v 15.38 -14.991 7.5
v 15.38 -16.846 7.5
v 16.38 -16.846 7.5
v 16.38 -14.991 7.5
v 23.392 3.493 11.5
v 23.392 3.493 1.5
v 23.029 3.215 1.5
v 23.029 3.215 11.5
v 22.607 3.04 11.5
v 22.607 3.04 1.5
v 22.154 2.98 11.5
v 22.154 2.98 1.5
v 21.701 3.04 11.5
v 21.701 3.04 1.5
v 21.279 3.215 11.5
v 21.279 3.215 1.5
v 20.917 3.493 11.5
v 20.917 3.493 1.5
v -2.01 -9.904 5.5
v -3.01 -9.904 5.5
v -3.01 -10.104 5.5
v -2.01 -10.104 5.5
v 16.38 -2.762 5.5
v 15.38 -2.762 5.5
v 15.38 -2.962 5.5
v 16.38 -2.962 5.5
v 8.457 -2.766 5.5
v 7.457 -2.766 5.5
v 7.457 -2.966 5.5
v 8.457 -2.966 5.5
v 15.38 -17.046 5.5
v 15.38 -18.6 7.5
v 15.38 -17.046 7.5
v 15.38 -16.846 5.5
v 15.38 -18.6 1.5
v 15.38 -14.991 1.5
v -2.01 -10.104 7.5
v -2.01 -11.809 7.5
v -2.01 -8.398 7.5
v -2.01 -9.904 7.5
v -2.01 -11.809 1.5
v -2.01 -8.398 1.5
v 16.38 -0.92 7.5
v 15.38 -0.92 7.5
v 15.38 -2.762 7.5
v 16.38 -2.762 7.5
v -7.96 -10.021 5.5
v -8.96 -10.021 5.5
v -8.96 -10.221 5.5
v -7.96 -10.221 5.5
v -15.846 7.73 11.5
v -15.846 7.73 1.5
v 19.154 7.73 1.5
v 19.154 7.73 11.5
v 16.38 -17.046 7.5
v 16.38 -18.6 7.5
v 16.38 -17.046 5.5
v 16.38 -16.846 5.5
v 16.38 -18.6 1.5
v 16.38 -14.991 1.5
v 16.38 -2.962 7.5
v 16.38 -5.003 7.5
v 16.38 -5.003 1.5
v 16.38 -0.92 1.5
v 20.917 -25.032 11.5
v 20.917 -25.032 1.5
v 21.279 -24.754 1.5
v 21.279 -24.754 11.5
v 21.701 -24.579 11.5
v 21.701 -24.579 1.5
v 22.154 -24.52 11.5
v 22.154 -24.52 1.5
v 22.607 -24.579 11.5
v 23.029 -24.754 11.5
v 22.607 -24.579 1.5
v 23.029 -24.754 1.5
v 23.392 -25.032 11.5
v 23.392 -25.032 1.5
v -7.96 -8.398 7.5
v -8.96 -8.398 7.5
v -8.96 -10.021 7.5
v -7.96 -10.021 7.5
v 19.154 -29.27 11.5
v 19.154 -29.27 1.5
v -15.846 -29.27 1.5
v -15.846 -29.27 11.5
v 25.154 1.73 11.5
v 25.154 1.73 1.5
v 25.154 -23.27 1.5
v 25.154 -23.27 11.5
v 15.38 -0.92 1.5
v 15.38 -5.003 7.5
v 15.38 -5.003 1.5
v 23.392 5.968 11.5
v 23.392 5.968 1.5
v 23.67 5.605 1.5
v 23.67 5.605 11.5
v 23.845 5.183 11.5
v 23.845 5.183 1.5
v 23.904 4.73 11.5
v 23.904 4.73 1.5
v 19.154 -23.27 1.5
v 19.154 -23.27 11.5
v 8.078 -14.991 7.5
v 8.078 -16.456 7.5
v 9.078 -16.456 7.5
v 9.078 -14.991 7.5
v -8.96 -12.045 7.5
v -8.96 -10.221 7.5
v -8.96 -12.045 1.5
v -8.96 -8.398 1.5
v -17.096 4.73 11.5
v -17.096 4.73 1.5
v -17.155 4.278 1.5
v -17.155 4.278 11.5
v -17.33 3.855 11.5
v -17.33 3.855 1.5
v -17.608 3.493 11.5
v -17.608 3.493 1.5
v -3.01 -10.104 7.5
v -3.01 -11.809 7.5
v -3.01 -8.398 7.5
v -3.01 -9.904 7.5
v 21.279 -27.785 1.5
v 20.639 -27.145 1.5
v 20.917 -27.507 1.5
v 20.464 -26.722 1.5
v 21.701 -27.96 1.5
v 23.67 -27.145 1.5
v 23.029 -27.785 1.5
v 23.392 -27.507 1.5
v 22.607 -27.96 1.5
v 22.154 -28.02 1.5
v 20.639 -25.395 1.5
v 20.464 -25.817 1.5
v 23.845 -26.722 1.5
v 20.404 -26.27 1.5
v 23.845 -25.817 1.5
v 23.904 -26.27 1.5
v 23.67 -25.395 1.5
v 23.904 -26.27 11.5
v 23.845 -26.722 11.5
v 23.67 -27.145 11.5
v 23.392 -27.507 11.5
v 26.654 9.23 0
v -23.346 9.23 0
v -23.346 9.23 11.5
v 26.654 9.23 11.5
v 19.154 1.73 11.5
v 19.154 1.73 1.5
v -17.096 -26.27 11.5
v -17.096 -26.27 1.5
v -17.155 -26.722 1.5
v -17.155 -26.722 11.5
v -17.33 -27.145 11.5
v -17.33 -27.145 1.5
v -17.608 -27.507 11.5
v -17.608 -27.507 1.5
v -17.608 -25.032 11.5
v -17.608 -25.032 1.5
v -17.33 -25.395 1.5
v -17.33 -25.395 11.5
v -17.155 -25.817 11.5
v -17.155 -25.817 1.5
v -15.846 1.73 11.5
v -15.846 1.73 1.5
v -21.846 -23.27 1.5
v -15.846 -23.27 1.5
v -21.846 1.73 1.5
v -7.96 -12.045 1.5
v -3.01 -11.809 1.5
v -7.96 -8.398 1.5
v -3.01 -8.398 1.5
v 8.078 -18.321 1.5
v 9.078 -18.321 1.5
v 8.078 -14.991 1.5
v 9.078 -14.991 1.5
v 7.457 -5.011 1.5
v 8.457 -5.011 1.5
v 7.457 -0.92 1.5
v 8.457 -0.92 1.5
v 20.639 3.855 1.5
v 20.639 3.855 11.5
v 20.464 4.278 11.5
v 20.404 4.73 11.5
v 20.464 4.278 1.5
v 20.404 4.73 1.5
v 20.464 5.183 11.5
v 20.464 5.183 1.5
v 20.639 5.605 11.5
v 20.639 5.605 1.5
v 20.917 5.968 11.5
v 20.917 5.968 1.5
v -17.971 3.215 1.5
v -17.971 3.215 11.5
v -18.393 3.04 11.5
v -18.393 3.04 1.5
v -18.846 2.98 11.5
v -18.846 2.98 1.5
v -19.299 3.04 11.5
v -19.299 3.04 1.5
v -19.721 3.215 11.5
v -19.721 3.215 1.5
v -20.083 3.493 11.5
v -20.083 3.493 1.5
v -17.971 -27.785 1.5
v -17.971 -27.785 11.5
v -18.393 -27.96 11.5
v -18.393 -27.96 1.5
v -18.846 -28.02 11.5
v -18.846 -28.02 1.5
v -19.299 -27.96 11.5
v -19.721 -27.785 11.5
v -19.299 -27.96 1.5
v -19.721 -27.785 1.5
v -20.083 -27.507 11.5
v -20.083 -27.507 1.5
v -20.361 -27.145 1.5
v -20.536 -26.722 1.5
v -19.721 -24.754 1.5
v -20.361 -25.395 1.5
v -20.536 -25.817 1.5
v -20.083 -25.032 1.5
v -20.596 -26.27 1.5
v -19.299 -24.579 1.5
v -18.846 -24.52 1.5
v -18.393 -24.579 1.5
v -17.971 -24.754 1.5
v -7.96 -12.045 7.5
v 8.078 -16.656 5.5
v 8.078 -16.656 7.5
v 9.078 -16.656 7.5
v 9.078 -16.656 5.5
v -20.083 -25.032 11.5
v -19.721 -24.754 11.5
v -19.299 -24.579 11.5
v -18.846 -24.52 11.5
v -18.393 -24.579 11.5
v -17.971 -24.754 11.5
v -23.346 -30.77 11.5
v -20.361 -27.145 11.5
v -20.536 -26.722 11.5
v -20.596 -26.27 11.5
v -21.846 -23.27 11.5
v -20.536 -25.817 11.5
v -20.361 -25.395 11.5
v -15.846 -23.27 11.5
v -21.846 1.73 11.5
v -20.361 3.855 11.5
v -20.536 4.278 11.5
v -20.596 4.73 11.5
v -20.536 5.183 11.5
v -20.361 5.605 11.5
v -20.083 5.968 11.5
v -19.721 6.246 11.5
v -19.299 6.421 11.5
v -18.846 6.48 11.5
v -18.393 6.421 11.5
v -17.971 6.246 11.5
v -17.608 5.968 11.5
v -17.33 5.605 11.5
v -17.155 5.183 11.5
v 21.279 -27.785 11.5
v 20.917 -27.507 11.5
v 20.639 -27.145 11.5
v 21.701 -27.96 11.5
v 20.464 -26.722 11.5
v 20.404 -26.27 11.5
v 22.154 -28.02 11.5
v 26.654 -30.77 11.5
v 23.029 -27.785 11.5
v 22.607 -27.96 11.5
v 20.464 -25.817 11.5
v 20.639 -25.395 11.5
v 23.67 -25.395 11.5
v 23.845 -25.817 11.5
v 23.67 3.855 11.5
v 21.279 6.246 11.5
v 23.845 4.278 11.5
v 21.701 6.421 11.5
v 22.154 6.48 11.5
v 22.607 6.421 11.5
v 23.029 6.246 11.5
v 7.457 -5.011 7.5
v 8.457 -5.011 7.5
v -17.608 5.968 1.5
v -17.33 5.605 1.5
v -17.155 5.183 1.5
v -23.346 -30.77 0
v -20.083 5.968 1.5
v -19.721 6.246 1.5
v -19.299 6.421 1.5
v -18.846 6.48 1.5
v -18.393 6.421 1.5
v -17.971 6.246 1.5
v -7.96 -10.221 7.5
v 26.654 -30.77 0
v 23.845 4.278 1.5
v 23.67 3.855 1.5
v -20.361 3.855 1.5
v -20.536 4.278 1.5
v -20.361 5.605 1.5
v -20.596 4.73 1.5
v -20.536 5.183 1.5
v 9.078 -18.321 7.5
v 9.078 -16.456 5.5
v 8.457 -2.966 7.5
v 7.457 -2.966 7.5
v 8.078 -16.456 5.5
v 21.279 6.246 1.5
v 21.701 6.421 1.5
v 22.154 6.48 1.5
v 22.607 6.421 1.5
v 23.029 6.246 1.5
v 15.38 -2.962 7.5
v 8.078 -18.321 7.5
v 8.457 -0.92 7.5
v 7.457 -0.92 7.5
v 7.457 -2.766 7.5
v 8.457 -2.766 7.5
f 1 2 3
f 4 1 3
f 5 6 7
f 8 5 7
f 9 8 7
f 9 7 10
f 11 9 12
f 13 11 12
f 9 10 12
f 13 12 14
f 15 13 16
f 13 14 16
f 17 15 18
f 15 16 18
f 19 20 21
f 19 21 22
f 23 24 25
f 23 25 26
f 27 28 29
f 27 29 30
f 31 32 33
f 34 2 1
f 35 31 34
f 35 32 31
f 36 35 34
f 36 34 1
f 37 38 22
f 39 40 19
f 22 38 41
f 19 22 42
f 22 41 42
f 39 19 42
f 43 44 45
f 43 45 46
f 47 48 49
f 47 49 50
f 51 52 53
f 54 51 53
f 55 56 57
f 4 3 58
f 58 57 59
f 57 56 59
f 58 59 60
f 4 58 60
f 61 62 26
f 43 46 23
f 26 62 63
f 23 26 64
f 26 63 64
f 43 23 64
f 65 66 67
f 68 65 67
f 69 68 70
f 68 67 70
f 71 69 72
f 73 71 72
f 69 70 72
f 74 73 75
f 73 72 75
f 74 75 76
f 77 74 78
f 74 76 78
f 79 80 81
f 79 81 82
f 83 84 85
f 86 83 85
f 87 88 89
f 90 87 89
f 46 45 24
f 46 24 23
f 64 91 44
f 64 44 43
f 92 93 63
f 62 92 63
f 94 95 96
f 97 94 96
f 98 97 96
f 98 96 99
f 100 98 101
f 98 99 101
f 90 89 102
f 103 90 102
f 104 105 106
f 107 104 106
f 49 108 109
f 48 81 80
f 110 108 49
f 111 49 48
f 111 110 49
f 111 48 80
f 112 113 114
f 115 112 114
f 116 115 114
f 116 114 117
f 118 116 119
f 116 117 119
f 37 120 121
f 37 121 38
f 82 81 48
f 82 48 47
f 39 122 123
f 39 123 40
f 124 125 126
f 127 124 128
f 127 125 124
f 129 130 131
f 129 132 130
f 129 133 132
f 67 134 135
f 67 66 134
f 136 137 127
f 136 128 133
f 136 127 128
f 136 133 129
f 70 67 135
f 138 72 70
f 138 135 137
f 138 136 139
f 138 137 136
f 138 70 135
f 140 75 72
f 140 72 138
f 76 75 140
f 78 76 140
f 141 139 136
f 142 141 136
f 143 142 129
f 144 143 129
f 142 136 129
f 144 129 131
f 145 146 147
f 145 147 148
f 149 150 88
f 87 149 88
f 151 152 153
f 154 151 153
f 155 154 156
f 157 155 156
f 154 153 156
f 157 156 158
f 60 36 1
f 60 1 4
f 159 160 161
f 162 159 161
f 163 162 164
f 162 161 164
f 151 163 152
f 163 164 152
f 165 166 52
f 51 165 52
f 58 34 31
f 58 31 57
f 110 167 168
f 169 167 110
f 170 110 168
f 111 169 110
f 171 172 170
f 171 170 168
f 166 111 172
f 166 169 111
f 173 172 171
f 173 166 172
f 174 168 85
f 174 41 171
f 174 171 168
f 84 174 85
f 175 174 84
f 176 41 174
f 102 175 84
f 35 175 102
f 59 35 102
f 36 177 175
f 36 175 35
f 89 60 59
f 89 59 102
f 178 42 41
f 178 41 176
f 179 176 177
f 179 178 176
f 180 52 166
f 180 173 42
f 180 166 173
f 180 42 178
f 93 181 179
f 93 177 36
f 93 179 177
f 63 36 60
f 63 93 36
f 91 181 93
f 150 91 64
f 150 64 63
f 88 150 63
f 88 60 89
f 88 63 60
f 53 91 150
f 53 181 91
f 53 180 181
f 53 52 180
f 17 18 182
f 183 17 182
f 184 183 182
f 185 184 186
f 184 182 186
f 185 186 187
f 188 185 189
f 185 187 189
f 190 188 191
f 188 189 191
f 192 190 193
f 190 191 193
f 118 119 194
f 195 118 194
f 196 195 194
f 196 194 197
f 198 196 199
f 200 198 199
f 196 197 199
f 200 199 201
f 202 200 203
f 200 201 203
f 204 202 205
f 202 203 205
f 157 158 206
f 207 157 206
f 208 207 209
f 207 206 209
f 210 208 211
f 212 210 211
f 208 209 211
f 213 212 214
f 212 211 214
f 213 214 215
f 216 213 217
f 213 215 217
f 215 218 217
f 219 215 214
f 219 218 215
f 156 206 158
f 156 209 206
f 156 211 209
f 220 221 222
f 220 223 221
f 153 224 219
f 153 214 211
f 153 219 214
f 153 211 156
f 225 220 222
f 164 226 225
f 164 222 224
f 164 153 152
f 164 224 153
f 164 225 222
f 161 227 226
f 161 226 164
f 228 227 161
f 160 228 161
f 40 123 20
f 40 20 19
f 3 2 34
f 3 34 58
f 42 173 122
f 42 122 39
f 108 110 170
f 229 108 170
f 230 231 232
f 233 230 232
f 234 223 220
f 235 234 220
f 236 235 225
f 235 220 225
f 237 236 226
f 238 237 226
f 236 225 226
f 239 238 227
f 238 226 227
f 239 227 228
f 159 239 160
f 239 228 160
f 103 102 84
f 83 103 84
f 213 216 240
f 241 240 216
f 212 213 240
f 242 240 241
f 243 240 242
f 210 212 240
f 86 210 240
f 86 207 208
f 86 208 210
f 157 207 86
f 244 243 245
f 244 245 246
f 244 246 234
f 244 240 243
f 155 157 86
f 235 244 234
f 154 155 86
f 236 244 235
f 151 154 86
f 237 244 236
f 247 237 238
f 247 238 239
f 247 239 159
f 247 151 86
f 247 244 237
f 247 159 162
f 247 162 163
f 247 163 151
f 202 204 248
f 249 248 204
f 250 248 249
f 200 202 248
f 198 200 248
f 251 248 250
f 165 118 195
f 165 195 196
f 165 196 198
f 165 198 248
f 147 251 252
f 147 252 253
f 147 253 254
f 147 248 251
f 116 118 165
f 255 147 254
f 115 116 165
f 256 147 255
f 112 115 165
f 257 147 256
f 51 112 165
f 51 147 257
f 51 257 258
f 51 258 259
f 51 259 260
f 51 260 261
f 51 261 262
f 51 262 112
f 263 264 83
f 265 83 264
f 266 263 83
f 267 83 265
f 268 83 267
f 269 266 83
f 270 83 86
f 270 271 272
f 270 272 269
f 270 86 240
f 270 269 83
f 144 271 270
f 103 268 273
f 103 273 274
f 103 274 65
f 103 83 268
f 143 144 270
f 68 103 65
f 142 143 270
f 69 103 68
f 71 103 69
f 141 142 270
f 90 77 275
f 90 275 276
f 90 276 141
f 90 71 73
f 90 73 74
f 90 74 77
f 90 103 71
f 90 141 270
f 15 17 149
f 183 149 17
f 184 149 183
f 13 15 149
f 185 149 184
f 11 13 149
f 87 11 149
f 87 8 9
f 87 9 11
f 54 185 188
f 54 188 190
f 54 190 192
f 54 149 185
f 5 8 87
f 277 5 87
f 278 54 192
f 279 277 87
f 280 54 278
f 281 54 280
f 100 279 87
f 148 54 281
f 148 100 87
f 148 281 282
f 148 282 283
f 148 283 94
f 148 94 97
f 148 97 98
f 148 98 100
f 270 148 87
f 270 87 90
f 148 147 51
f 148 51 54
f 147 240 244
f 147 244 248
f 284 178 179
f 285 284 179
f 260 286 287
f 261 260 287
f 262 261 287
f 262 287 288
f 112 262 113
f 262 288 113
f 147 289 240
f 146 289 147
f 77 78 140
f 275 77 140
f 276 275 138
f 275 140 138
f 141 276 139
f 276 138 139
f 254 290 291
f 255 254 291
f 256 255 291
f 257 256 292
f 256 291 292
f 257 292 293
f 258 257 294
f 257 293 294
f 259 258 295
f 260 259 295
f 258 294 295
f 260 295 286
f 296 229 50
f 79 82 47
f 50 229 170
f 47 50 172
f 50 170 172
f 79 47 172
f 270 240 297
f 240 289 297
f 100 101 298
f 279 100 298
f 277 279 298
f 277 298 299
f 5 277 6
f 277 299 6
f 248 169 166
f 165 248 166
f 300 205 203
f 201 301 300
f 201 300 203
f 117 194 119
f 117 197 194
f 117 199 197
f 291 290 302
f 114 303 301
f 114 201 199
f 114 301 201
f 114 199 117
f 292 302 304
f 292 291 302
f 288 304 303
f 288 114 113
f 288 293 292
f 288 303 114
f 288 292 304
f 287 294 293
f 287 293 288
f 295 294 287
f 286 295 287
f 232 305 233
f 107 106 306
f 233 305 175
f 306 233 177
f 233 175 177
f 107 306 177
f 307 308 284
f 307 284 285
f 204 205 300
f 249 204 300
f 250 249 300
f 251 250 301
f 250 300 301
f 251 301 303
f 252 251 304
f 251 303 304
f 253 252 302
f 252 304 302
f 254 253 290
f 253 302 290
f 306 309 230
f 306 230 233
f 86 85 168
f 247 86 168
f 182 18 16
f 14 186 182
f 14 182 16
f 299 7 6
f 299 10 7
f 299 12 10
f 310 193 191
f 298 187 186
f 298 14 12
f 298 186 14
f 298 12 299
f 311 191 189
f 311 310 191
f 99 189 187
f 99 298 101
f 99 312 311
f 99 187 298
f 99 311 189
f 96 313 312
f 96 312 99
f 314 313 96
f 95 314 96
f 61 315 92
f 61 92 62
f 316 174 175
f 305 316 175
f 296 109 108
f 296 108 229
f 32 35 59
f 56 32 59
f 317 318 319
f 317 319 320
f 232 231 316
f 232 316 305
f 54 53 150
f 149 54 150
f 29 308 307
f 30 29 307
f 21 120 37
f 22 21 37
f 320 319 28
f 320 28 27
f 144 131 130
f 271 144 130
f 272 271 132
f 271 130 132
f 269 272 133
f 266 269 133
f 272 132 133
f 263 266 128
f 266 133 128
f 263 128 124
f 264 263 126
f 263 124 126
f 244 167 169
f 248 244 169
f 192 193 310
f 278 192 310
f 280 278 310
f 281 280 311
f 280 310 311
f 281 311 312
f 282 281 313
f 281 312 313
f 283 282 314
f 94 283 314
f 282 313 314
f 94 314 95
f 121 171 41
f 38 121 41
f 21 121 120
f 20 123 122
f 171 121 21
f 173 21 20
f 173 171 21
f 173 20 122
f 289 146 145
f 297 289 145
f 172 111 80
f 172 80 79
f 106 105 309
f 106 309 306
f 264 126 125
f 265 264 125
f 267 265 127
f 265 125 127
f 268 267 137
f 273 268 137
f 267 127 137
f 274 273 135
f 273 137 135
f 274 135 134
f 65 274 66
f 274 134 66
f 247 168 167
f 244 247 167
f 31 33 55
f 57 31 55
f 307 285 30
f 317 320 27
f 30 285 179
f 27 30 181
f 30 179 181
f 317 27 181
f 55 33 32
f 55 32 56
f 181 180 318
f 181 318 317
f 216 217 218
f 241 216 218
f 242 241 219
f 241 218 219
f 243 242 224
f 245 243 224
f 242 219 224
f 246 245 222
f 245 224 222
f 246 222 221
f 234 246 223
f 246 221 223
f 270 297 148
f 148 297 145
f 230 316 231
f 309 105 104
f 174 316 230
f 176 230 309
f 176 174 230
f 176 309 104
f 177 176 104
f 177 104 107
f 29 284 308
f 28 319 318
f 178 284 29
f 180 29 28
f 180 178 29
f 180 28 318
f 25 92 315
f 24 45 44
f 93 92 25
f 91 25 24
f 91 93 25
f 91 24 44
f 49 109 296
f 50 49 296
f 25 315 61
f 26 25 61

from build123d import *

# Parameters (mm, degrees)
F0_W      = 50
F0_H      = 40
F1_DEPTH  = 1.5
F2_W      = 50
F2_H      = 40
F3_DEPTH  = 10
F5_DEPTH  = 10
F7_DEPTH  = 10
F9_DEPTH  = 10
F11_DEPTH = 10
F14_W     = 1
F14_H     = 4.08333
F15_DEPTH = 6
F16_W     = 1
F16_H     = 0.2
F17_DEPTH = 2
F18_W     = 1
F18_H     = 3.60977
F19_DEPTH = 6
F20_W     = 1
F20_H     = 0.2
F21_DEPTH = 2
F22_W     = 1
F22_H     = 4.091013
F23_DEPTH = 6
F24_W     = 1
F24_H     = 0.2
F25_DEPTH = 2
F26_W     = 1
F26_H     = 3.330472
F27_DEPTH = 6
F28_W     = 1
F28_H     = 0.2
F29_DEPTH = 2
F30_W     = 1
F30_H     = 3.411457
F31_DEPTH = 6
F32_W     = 1
F32_H     = 0.2
F33_DEPTH = 2
F34_W     = 1
F34_H     = 3.646998
F35_DEPTH = 6
F36_W     = 1
F36_H     = 0.2
F37_DEPTH = 2


with BuildPart() as f1:
    # F0 (on Top) → F1 (new body)
    with BuildSketch(Plane.XY):
        with Locations((1.654343, -10.769538)):
            Rectangle(F0_W, F0_H)
    extrude(amount=F1_DEPTH)

    # F2 (on face) → F3 (join)
    with BuildSketch(Plane.XY.offset(1.5)):
        with Locations((1.654343, -10.769538)):
            Rectangle(F2_W, F2_H)
        Polygon((-21.845657, -29.269538), (-21.845657, 7.730462), (19.154343, 7.730462), (25.154343, 7.730462), (25.154343, 1.730462), (25.154343, -29.269538), align=None, mode=Mode.SUBTRACT)
    extrude(amount=F3_DEPTH)

    # F4 (on face) → F5 (join)
    with BuildSketch(Plane.XY.offset(1.5)):
        with BuildLine():
            Line((-20.083094, 5.967899), (-21.845657, 7.730462))
            Line((-21.845657, 7.730462), (-21.845657, 1.730462))
            Line((-21.845657, 1.730462), (-20.083094, 3.493025))
            ThreePointArc((-20.083094, 3.493025), (-20.595657, 4.730462), (-20.083094, 5.967899))
        make_face()
        with BuildLine():
            Line((-15.845657, 7.730462), (-21.845657, 7.730462))
            Line((-21.845657, 7.730462), (-20.083094, 5.967899))
            ThreePointArc((-20.083094, 5.967899), (-18.845657, 6.480462), (-17.60822, 5.967899))
            Line((-17.60822, 5.967899), (-15.845657, 7.730462))
        make_face()
        with BuildLine():
            Line((-15.845657, 1.730462), (-15.845657, 7.730462))
            Line((-15.845657, 7.730462), (-17.60822, 5.967899))
            ThreePointArc((-17.60822, 5.967899), (-17.228868, 5.400158), (-17.095657, 4.730462))
            ThreePointArc((-17.095657, 4.730462), (-17.228868, 4.060766), (-17.60822, 3.493025))
            Line((-17.60822, 3.493025), (-15.845657, 1.730462))
        make_face()
        with BuildLine():
            Line((-20.083094, 3.493025), (-21.845657, 1.730462))
            Line((-21.845657, 1.730462), (-15.845657, 1.730462))
            Line((-15.845657, 1.730462), (-17.60822, 3.493025))
            ThreePointArc((-17.60822, 3.493025), (-18.845657, 2.980462), (-20.083094, 3.493025))
        make_face()
    extrude(amount=F5_DEPTH)

    # F6 (on face) → F7 (join)
    with BuildSketch(Plane.XY.offset(1.5)):
        with BuildLine():
            Line((-20.083094, -27.506975), (-21.845657, -29.269538))
            Line((-21.845657, -29.269538), (-15.845657, -29.269538))
            Line((-15.845657, -29.269538), (-17.60822, -27.506975))
            ThreePointArc((-17.60822, -27.506975), (-18.845657, -28.019538), (-20.083094, -27.506975))
        make_face()
        with BuildLine():
            Line((-21.845657, -23.269538), (-21.845657, -29.269538))
            Line((-21.845657, -29.269538), (-20.083094, -27.506975))
            ThreePointArc((-20.083094, -27.506975), (-20.595657, -26.269538), (-20.083094, -25.032101))
            Line((-20.083094, -25.032101), (-21.845657, -23.269538))
        make_face()
        with BuildLine():
            Line((-17.60822, -27.506975), (-15.845657, -29.269538))
            Line((-15.845657, -29.269538), (-15.845657, -23.269538))
            Line((-15.845657, -23.269538), (-17.60822, -25.032101))
            ThreePointArc((-17.60822, -25.032101), (-17.228868, -25.599842), (-17.095657, -26.269538))
            ThreePointArc((-17.095657, -26.269538), (-17.228868, -26.939234), (-17.60822, -27.506975))
        make_face()
        with BuildLine():
            Line((-15.845657, -23.269538), (-21.845657, -23.269538))
            Line((-21.845657, -23.269538), (-20.083094, -25.032101))
            ThreePointArc((-20.083094, -25.032101), (-18.845657, -24.519538), (-17.60822, -25.032101))
            Line((-17.60822, -25.032101), (-15.845657, -23.269538))
        make_face()
    extrude(amount=F7_DEPTH)

    # F8 (on face) → F9 (join)
    with BuildSketch(Plane.XY.offset(1.5)):
        with BuildLine():
            Line((23.39178, 5.967899), (25.154343, 7.730462))
            Line((25.154343, 7.730462), (19.154343, 7.730462))
            Line((19.154343, 7.730462), (20.916906, 5.967899))
            ThreePointArc((20.916906, 5.967899), (22.154343, 6.480462), (23.39178, 5.967899))
        make_face()
        with BuildLine():
            Line((25.154343, 1.730462), (25.154343, 7.730462))
            Line((25.154343, 7.730462), (23.39178, 5.967899))
            ThreePointArc((23.39178, 5.967899), (23.771132, 5.400158), (23.904343, 4.730462))
            ThreePointArc((23.904343, 4.730462), (23.771132, 4.060766), (23.39178, 3.493025))
            Line((23.39178, 3.493025), (25.154343, 1.730462))
        make_face()
        with BuildLine():
            Line((20.916906, 5.967899), (19.154343, 7.730462))
            Line((19.154343, 7.730462), (19.154343, 1.730462))
            Line((19.154343, 1.730462), (20.916906, 3.493025))
            ThreePointArc((20.916906, 3.493025), (20.404343, 4.730462), (20.916906, 5.967899))
        make_face()
        with BuildLine():
            Line((19.154343, 1.730462), (25.154343, 1.730462))
            Line((25.154343, 1.730462), (23.39178, 3.493025))
            ThreePointArc((23.39178, 3.493025), (22.154343, 2.980462), (20.916906, 3.493025))
            Line((20.916906, 3.493025), (19.154343, 1.730462))
        make_face()
    extrude(amount=F9_DEPTH)

    # F10 (on face) → F11 (join)
    with BuildSketch(Plane.XY.offset(1.5)):
        with BuildLine():
            Line((23.39178, -27.506975), (25.154343, -29.269538))
            Line((25.154343, -29.269538), (25.154343, -23.269538))
            Line((25.154343, -23.269538), (23.39178, -25.032101))
            ThreePointArc((23.39178, -25.032101), (23.771132, -25.599842), (23.904343, -26.269538))
            ThreePointArc((23.904343, -26.269538), (23.771132, -26.939234), (23.39178, -27.506975))
        make_face()
        with BuildLine():
            Line((19.154343, -29.269538), (25.154343, -29.269538))
            Line((25.154343, -29.269538), (23.39178, -27.506975))
            ThreePointArc((23.39178, -27.506975), (22.154343, -28.019538), (20.916906, -27.506975))
            Line((20.916906, -27.506975), (19.154343, -29.269538))
        make_face()
        with BuildLine():
            Line((19.154343, -23.269538), (19.154343, -29.269538))
            Line((19.154343, -29.269538), (20.916906, -27.506975))
            ThreePointArc((20.916906, -27.506975), (20.404343, -26.269538), (20.916906, -25.032101))
            Line((20.916906, -25.032101), (19.154343, -23.269538))
        make_face()
        with BuildLine():
            Line((23.39178, -25.032101), (25.154343, -23.269538))
            Line((25.154343, -23.269538), (19.154343, -23.269538))
            Line((19.154343, -23.269538), (20.916906, -25.032101))
            ThreePointArc((20.916906, -25.032101), (22.154343, -24.519538), (23.39178, -25.032101))
        make_face()
    extrude(amount=F11_DEPTH)

    # F14 (on face) → F15 (join)
    with BuildSketch(Plane.XY.offset(1.5)):
        with Locations((15.880012, -2.9618)):
            Rectangle(F14_W, F14_H)
    extrude(amount=F15_DEPTH)

    # F16 (on face) → F17 (cut)
    with BuildSketch(Plane.XY.offset(7.5)):
        with Locations((15.880012, -2.8618)):
            Rectangle(F16_W, F16_H)
    extrude(amount=-F17_DEPTH, mode=Mode.SUBTRACT)

    # F18 (on face) → F19 (join)
    with BuildSketch(Plane.XY.offset(1.5)):
        with Locations((15.880012, -16.79546)):
            Rectangle(F18_W, F18_H)
    extrude(amount=F19_DEPTH)

    # F20 (on face) → F21 (cut)
    with BuildSketch(Plane.XY.offset(7.5)):
        with Locations((15.880012, -16.945772)):
            Rectangle(F20_W, F20_H)
    extrude(amount=-F21_DEPTH, mode=Mode.SUBTRACT)

    # F22 (on face) → F23 (join)
    with BuildSketch(Plane.XY.offset(1.5)):
        with Locations((7.957027, -2.965641)):
            Rectangle(F22_W, F22_H)
    extrude(amount=F23_DEPTH)

    # F24 (on face) → F25 (cut)
    with BuildSketch(Plane.XY.offset(7.5)):
        with Locations((7.957027, -2.865641)):
            Rectangle(F24_W, F24_H)
    extrude(amount=-F25_DEPTH, mode=Mode.SUBTRACT)

    # F26 (on face) → F27 (join)
    with BuildSketch(Plane.XY.offset(1.5)):
        with Locations((8.577565, -16.655811)):
            Rectangle(F26_W, F26_H)
    extrude(amount=F27_DEPTH)

    # F28 (on face) → F29 (cut)
    with BuildSketch(Plane.XY.offset(7.5)):
        with Locations((8.577565, -16.555811)):
            Rectangle(F28_W, F28_H)
    extrude(amount=-F29_DEPTH, mode=Mode.SUBTRACT)

    # F30 (on face) → F31 (join)
    with BuildSketch(Plane.XY.offset(1.5)):
        with Locations((-2.510325, -10.103692)):
            Rectangle(F30_W, F30_H)
    extrude(amount=F31_DEPTH)

    # F32 (on face) → F33 (cut)
    with BuildSketch(Plane.XY.offset(7.5)):
        with Locations((-2.510325, -10.003692)):
            Rectangle(F32_W, F32_H)
    extrude(amount=-F33_DEPTH, mode=Mode.SUBTRACT)

    # F34 (on face) → F35 (join)
    with BuildSketch(Plane.XY.offset(1.5)):
        with Locations((-8.459517, -10.221463)):
            Rectangle(F34_W, F34_H)
    extrude(amount=F35_DEPTH)

    # F36 (on face) → F37 (cut)
    with BuildSketch(Plane.XY.offset(7.5)):
        with Locations((-8.459517, -10.121463)):
            Rectangle(F36_W, F36_H)
    extrude(amount=-F37_DEPTH, mode=Mode.SUBTRACT)


with BuildPart() as f12_1:
    # F12: copy of F1
    add(f1.part)


solid = f1.part
